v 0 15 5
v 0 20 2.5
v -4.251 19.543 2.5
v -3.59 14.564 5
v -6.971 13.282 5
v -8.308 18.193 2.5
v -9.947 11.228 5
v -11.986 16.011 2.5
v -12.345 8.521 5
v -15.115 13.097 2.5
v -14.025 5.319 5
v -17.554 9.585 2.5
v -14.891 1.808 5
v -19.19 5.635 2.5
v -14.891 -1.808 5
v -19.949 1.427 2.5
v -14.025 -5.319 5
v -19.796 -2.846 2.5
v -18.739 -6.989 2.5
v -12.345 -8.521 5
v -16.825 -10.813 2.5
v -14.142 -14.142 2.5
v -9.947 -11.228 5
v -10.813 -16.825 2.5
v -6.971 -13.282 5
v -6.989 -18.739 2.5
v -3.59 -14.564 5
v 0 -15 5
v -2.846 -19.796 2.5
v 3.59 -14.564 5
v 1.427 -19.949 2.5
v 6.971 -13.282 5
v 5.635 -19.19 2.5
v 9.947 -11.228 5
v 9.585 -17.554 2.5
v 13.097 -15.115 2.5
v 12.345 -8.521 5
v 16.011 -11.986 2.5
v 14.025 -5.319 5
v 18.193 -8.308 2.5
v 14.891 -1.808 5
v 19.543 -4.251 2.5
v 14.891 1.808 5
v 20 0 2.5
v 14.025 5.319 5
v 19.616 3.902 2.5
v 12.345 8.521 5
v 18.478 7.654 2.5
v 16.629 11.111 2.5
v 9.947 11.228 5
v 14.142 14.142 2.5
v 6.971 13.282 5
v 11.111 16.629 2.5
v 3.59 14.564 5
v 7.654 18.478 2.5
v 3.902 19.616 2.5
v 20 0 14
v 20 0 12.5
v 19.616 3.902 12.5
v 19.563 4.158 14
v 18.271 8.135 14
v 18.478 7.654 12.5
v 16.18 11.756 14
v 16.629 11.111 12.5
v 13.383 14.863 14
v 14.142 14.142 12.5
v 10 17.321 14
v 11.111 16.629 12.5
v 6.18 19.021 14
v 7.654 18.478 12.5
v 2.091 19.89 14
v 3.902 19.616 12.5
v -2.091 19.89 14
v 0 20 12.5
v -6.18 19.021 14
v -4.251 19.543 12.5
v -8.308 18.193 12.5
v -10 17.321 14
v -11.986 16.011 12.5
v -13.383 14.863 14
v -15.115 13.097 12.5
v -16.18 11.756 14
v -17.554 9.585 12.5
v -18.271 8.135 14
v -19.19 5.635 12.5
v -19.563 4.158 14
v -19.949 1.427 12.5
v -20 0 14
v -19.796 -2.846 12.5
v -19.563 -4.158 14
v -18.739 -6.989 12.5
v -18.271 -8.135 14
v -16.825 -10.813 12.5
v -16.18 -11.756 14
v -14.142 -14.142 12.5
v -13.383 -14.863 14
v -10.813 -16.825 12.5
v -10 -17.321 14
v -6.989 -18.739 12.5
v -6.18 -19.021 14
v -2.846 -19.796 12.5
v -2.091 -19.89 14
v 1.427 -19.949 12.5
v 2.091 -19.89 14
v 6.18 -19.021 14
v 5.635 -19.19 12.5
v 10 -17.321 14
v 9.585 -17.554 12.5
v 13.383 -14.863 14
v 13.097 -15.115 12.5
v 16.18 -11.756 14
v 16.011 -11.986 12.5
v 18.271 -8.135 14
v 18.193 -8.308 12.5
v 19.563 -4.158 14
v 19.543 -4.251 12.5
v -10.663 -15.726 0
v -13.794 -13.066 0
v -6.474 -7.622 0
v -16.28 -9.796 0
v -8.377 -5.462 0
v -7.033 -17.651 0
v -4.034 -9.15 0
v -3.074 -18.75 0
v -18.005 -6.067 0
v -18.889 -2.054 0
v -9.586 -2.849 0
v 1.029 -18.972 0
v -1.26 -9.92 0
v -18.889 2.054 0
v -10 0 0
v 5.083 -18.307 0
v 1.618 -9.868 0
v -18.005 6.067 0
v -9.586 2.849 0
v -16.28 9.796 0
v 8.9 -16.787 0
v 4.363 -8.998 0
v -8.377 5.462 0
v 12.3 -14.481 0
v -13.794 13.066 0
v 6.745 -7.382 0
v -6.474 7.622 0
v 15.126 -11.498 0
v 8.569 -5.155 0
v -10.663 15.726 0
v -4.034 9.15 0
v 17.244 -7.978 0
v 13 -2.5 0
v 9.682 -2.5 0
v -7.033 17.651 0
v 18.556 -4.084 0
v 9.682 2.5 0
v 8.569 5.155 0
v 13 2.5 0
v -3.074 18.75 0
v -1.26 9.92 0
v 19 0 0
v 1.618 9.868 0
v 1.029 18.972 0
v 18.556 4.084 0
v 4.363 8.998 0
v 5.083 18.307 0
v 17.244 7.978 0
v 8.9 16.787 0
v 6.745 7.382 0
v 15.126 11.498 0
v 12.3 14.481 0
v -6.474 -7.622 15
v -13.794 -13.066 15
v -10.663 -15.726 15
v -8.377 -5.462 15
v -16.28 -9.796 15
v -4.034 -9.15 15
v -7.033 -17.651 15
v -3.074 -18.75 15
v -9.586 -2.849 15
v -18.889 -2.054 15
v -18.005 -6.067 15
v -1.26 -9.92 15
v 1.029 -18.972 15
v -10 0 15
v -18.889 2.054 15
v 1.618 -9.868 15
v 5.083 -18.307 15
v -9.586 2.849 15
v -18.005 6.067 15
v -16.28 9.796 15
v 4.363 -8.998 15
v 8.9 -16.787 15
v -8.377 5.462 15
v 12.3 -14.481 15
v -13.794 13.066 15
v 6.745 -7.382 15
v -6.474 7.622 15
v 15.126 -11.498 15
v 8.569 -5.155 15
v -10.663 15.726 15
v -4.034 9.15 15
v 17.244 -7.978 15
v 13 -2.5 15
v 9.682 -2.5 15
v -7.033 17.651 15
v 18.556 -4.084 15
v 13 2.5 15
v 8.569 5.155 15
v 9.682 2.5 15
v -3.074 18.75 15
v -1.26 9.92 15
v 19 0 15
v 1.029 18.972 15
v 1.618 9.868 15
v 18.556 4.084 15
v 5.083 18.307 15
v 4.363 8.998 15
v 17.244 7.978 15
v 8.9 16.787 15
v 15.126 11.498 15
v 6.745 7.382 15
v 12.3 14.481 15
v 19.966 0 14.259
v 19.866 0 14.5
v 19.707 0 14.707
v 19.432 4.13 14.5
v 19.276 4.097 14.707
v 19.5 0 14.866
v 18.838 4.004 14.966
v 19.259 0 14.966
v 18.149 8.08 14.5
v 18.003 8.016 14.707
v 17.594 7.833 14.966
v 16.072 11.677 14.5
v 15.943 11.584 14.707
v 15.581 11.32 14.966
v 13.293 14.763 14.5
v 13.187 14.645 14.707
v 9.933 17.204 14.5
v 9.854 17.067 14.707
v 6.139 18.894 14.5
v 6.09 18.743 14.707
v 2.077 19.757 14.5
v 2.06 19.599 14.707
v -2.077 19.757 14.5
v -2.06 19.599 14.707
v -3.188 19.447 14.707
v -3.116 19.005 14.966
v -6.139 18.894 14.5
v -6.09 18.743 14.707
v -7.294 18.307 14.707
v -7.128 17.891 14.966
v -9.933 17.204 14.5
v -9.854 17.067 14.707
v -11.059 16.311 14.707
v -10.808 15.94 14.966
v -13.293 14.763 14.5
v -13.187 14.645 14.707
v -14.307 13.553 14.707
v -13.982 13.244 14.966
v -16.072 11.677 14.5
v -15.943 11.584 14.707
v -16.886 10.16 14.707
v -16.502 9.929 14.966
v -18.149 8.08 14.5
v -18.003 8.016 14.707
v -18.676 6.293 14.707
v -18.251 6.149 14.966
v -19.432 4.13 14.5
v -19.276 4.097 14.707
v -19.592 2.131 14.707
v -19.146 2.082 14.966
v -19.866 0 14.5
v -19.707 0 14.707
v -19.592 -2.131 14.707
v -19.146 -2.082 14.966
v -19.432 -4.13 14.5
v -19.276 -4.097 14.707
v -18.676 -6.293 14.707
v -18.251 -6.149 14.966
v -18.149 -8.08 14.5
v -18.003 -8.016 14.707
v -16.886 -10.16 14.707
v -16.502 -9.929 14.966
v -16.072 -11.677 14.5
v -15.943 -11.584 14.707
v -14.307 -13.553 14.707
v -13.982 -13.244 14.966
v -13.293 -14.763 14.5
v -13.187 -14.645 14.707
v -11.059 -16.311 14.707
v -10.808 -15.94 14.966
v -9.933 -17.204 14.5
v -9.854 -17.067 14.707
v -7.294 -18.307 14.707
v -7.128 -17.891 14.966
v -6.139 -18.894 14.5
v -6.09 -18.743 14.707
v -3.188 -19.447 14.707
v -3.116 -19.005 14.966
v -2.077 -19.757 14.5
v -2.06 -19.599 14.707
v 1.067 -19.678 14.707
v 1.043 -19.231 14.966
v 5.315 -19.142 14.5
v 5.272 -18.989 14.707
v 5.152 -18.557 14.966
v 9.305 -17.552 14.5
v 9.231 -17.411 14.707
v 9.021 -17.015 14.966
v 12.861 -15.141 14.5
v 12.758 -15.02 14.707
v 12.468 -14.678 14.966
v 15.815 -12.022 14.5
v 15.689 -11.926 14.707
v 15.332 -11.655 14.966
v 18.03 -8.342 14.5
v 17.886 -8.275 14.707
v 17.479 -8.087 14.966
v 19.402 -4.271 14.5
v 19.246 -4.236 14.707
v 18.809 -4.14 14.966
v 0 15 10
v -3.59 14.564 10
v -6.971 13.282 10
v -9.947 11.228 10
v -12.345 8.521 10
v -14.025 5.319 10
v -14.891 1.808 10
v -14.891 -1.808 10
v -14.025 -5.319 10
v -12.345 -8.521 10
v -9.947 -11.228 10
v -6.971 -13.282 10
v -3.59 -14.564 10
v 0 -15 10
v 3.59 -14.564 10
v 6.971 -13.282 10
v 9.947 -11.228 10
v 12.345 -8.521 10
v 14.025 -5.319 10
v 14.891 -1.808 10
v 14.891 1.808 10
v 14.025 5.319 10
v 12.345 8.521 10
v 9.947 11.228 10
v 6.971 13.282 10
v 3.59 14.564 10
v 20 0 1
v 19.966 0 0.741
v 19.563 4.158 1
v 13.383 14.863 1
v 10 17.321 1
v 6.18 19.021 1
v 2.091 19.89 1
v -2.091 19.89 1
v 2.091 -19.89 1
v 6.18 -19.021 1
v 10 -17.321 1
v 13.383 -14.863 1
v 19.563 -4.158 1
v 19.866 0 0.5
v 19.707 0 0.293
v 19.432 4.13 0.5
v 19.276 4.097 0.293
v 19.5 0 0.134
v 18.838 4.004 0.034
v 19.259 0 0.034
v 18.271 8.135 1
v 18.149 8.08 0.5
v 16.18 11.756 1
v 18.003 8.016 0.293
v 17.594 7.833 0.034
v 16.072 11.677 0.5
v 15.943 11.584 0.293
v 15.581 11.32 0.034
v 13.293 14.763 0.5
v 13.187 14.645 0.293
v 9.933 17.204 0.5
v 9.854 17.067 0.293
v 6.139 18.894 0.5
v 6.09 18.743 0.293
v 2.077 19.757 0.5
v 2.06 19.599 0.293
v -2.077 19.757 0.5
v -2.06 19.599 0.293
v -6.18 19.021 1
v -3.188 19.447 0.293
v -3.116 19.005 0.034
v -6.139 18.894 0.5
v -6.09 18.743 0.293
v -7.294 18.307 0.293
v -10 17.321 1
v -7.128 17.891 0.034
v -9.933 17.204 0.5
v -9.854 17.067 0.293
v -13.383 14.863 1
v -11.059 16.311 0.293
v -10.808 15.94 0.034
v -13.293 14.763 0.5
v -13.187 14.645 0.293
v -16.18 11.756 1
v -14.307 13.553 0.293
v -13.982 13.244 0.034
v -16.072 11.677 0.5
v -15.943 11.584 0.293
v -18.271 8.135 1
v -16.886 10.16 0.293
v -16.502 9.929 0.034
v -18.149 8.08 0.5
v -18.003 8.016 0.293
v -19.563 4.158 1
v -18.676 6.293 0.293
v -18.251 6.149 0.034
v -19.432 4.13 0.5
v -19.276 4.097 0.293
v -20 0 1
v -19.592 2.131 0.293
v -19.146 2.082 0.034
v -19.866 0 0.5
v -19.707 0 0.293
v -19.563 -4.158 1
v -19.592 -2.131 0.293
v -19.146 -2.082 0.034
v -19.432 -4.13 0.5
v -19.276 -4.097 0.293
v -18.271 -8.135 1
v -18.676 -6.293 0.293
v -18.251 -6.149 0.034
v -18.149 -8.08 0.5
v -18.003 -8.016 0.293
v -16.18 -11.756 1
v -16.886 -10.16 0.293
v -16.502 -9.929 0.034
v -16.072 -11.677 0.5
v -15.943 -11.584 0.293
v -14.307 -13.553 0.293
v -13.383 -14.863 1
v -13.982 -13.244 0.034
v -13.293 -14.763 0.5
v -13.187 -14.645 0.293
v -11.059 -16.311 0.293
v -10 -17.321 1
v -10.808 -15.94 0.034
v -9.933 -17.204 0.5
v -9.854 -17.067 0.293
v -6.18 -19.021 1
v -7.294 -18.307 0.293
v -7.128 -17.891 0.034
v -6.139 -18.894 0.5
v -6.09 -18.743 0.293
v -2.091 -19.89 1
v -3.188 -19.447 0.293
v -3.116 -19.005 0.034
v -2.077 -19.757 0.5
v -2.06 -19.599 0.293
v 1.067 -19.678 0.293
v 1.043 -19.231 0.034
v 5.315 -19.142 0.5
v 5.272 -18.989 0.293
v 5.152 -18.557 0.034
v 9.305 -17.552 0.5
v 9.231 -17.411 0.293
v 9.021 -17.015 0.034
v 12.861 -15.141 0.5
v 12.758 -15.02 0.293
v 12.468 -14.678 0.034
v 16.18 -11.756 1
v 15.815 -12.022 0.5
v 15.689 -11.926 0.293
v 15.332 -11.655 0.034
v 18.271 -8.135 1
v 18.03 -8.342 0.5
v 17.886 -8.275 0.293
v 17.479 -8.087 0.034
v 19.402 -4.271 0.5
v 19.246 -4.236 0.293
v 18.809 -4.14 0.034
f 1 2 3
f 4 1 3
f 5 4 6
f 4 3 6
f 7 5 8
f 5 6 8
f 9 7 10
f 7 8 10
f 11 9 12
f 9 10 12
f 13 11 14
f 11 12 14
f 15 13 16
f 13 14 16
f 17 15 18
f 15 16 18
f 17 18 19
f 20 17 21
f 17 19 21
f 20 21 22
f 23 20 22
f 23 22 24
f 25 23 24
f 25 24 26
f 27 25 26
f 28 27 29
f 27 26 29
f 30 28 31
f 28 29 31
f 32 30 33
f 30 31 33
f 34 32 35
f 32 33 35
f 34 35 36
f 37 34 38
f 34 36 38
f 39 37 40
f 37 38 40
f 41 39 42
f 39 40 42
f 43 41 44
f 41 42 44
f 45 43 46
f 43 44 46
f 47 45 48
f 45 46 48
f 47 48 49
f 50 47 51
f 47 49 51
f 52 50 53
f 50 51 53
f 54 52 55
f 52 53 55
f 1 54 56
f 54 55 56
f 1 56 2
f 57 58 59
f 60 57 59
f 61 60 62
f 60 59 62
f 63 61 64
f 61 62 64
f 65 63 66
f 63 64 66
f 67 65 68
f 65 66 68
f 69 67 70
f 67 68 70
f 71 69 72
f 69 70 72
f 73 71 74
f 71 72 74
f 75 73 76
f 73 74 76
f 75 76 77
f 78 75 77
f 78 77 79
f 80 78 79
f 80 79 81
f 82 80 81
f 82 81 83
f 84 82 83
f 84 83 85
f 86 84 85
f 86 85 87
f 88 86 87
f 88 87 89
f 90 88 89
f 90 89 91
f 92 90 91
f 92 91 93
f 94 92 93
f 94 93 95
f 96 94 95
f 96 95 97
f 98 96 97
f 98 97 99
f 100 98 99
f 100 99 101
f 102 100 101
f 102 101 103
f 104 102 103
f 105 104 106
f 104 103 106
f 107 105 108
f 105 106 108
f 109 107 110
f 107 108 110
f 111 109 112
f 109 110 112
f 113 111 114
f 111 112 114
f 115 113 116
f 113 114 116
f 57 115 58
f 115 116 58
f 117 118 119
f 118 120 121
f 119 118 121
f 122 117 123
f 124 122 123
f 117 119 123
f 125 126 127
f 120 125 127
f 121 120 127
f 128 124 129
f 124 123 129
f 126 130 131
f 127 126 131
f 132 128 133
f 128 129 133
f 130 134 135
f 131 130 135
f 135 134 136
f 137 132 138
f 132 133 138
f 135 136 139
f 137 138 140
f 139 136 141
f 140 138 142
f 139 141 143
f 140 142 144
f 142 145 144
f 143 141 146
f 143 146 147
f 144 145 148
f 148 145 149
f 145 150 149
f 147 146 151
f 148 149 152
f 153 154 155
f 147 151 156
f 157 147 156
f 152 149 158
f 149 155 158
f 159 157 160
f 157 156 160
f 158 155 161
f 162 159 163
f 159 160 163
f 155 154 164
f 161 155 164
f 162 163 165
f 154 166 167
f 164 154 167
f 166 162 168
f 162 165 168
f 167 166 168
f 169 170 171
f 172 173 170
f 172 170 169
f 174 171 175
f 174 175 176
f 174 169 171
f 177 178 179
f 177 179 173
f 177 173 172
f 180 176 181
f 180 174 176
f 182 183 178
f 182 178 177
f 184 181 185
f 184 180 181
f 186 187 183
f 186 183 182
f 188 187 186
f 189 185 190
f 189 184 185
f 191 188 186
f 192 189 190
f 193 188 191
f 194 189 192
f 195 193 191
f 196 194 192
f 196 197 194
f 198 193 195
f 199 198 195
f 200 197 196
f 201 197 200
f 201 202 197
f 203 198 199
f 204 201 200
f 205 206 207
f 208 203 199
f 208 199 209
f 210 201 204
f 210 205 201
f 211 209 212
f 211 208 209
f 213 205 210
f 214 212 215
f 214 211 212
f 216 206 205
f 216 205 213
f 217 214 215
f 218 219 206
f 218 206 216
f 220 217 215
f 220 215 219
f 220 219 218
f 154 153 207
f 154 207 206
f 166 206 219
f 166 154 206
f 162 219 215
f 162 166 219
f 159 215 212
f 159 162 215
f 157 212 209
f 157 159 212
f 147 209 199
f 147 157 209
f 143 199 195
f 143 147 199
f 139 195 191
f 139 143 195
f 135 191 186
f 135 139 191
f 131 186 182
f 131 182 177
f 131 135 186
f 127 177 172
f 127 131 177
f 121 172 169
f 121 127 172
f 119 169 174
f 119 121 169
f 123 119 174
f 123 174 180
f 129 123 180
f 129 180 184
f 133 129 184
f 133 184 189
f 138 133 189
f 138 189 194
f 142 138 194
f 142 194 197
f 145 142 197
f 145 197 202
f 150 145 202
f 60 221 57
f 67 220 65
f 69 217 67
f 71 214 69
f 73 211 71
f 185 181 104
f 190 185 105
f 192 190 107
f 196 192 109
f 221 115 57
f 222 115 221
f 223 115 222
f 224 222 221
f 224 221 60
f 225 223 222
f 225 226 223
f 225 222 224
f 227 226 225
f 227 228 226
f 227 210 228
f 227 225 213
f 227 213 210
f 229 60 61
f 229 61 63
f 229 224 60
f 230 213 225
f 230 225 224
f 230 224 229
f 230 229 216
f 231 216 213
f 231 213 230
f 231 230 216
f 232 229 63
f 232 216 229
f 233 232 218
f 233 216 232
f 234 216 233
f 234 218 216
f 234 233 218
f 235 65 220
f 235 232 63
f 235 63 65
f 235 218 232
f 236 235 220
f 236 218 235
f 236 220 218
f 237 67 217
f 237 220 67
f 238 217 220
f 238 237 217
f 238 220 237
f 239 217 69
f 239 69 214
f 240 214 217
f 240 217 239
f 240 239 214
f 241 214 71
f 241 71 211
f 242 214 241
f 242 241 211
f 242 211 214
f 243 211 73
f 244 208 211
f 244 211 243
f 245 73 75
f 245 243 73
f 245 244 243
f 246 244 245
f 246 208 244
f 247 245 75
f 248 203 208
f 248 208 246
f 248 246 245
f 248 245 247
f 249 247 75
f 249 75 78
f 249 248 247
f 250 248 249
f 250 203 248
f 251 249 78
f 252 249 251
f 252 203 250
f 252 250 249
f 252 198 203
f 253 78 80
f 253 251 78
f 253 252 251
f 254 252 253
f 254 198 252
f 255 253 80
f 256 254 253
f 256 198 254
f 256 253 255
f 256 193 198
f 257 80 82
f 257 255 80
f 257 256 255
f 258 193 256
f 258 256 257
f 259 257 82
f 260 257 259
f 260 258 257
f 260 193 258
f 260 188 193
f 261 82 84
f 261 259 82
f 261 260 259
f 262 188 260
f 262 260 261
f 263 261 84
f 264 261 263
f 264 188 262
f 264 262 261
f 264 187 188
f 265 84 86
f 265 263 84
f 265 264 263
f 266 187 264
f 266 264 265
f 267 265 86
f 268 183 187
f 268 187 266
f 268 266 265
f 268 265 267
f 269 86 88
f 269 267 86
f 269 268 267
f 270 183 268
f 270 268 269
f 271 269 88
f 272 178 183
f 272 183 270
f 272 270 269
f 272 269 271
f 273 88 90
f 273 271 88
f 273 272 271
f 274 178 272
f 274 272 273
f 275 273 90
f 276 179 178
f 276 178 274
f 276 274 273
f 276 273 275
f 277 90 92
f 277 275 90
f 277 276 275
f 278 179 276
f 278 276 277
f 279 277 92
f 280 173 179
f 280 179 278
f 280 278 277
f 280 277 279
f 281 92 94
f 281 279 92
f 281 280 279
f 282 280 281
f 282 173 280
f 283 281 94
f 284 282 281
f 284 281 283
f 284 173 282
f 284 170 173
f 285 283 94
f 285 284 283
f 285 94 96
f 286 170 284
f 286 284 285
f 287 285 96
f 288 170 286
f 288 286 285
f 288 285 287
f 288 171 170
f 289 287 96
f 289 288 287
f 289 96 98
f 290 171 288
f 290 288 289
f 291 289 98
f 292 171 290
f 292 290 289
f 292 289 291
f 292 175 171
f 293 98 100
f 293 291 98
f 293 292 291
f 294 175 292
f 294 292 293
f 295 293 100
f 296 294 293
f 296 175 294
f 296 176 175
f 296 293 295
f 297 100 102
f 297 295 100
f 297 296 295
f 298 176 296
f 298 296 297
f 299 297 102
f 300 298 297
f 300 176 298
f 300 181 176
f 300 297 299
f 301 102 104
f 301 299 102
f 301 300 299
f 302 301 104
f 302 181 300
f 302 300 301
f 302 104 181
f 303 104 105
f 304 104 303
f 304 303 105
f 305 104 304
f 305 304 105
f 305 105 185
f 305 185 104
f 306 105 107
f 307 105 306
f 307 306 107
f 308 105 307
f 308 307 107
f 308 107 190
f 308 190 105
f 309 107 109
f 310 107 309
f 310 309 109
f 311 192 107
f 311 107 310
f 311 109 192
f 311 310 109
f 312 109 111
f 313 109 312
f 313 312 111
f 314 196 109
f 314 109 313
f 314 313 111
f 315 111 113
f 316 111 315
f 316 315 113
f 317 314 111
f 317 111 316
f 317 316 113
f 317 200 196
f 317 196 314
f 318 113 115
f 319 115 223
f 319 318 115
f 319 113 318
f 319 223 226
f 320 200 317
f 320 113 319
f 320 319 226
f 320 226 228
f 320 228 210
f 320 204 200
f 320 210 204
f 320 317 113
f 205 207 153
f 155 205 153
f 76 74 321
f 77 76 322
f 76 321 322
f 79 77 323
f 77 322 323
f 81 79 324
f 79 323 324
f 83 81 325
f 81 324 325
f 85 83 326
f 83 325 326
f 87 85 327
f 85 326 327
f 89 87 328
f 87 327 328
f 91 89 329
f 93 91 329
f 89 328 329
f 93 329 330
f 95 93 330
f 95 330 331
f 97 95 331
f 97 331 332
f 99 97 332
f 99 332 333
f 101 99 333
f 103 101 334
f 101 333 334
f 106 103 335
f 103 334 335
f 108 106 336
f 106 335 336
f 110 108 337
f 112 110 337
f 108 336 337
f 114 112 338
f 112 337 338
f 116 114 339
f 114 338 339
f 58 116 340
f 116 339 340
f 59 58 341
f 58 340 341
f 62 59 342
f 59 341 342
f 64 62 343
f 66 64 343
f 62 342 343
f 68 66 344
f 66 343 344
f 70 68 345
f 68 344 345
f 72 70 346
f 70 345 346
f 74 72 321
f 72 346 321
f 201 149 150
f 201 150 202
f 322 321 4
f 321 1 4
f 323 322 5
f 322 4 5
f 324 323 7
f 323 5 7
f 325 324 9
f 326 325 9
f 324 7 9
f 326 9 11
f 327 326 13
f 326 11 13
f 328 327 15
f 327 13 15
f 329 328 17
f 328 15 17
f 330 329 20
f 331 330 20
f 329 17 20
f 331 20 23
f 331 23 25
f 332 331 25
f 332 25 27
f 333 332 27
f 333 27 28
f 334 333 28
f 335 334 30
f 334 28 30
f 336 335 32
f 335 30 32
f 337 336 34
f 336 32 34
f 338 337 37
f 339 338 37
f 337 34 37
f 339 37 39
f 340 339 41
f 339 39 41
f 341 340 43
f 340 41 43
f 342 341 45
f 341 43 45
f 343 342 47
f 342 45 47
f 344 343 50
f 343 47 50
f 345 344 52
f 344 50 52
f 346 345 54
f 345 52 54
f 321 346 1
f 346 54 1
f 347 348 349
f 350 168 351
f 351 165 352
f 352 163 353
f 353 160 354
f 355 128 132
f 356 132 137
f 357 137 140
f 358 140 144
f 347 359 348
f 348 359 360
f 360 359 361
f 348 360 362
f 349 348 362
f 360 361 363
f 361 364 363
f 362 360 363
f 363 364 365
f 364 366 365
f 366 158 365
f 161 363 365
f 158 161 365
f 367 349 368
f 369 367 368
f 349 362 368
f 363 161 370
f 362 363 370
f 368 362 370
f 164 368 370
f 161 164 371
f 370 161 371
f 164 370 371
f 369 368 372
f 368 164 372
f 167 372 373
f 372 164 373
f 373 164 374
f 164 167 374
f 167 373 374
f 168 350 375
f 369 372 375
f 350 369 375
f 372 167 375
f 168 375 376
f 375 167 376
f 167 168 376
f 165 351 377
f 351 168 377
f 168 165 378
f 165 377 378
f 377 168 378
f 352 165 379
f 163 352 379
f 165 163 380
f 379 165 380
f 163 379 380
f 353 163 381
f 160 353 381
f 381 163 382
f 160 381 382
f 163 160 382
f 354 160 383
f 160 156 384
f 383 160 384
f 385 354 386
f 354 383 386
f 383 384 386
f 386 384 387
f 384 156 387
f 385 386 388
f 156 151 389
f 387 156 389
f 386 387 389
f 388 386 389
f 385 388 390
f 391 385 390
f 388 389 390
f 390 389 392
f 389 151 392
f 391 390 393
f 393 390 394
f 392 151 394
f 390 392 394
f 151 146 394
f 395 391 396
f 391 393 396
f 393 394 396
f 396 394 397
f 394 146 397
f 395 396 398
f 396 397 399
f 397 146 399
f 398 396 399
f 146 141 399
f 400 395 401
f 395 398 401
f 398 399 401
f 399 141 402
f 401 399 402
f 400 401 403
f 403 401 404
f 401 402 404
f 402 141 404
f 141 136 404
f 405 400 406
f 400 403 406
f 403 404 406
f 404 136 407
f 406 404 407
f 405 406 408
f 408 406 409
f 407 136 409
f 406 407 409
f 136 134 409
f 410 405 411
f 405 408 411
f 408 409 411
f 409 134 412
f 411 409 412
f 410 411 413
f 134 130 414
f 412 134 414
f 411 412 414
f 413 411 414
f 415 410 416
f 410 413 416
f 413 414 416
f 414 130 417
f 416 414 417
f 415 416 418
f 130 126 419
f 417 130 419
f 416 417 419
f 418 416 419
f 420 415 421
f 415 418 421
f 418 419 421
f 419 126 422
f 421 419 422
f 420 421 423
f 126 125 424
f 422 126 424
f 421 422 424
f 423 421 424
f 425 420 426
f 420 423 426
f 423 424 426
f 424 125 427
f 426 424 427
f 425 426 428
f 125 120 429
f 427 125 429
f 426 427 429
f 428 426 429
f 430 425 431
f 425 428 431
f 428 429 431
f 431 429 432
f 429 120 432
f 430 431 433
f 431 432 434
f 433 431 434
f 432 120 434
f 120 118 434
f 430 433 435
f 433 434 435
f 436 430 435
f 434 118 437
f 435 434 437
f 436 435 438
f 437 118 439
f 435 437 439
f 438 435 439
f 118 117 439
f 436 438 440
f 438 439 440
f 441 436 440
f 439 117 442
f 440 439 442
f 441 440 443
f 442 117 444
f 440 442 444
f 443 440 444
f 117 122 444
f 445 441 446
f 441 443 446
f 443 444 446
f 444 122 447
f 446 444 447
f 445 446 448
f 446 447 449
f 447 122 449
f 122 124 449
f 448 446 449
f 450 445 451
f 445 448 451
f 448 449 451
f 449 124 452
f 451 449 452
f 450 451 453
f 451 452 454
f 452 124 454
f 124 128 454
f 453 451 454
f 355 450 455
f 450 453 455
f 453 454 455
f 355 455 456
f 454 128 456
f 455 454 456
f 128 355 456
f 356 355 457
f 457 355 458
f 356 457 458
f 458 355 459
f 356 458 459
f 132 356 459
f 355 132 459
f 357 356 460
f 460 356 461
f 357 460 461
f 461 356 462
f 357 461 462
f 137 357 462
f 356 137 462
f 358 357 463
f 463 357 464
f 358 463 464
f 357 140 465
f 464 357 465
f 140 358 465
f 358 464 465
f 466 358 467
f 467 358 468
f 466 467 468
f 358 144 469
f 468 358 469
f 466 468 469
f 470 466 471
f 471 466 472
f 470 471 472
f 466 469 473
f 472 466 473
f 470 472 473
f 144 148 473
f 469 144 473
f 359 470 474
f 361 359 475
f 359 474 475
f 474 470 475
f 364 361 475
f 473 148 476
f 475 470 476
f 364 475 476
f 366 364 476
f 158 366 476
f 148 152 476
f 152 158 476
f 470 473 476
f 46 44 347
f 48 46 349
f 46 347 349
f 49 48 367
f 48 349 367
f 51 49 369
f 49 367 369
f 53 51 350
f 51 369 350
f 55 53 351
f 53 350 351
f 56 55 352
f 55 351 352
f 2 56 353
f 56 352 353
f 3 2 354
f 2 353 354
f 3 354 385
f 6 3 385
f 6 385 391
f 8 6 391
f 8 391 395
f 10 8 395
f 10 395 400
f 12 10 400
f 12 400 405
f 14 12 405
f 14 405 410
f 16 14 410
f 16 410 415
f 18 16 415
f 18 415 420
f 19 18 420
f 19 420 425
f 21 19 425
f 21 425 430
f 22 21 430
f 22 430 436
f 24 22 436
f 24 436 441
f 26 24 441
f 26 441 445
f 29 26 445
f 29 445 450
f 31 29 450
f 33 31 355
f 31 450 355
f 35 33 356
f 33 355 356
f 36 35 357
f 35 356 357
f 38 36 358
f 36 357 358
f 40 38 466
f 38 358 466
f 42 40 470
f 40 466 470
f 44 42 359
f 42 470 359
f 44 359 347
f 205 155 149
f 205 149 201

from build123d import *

# Parameters (mm, degrees)
SKETCH_1_R               = 20
SKETCH_1_R_2             = 10
EXTRUDE_1_DEPTH          = 15
CUT_EXTRUDE_1_DEPTH      = 3
CUT_EXTRUDE_1_DEPTH_BACK = 10
FILLET_1_R               = 1


with BuildPart() as part:
    # 草图1 → 凸台-拉伸1 (new body)
    with BuildSketch(Plane.XY):
        Circle(SKETCH_1_R)
        Circle(SKETCH_1_R_2, mode=Mode.SUBTRACT)
    extrude(amount=EXTRUDE_1_DEPTH)

    # 草图2 → 切除-旋转1 (revolve, cut)
    with BuildSketch(Plane(origin=(0, 0, 0), x_dir=(0, 0, -1), z_dir=(1, 0, 0))):
        Polygon((-5, 15), (-2.5, 20), (-12.5, 20), (-10, 15), align=None)
    revolve(axis=Axis((0, 0, -0.75), (0, 0, 1)), mode=Mode.SUBTRACT)

    # 草图3 → 切除-拉伸1 (cut, two sides)
    with BuildSketch(Plane(origin=(10, 0, 0), x_dir=(0, 0, -1), z_dir=(1, 0, 0))) as cut_extrude_1_sk:
        with BuildLine():
            Line((-15.73557603, 2.5), (0, 2.5))
            ThreePointArc((0, 2.5), (2.5, 0), (0, -2.5))
            Line((0, -2.5), (-15.73557603, -2.5))
            ThreePointArc((-15.73557603, -2.5), (-18.23557603, 0), (-15.73557603, 2.5))
        make_face()
    extrude(amount=CUT_EXTRUDE_1_DEPTH, mode=Mode.SUBTRACT)
    extrude(cut_extrude_1_sk.sketch, amount=-CUT_EXTRUDE_1_DEPTH_BACK, mode=Mode.SUBTRACT)

    # 圆角1
    fillet_1_edges = [part.edges().sort_by_distance(p)[0] for p in [
        (-20, 0, 0),
        (-20, 0, 15),
    ]]
    fillet(fillet_1_edges, radius=FILLET_1_R)


solid = part.part
